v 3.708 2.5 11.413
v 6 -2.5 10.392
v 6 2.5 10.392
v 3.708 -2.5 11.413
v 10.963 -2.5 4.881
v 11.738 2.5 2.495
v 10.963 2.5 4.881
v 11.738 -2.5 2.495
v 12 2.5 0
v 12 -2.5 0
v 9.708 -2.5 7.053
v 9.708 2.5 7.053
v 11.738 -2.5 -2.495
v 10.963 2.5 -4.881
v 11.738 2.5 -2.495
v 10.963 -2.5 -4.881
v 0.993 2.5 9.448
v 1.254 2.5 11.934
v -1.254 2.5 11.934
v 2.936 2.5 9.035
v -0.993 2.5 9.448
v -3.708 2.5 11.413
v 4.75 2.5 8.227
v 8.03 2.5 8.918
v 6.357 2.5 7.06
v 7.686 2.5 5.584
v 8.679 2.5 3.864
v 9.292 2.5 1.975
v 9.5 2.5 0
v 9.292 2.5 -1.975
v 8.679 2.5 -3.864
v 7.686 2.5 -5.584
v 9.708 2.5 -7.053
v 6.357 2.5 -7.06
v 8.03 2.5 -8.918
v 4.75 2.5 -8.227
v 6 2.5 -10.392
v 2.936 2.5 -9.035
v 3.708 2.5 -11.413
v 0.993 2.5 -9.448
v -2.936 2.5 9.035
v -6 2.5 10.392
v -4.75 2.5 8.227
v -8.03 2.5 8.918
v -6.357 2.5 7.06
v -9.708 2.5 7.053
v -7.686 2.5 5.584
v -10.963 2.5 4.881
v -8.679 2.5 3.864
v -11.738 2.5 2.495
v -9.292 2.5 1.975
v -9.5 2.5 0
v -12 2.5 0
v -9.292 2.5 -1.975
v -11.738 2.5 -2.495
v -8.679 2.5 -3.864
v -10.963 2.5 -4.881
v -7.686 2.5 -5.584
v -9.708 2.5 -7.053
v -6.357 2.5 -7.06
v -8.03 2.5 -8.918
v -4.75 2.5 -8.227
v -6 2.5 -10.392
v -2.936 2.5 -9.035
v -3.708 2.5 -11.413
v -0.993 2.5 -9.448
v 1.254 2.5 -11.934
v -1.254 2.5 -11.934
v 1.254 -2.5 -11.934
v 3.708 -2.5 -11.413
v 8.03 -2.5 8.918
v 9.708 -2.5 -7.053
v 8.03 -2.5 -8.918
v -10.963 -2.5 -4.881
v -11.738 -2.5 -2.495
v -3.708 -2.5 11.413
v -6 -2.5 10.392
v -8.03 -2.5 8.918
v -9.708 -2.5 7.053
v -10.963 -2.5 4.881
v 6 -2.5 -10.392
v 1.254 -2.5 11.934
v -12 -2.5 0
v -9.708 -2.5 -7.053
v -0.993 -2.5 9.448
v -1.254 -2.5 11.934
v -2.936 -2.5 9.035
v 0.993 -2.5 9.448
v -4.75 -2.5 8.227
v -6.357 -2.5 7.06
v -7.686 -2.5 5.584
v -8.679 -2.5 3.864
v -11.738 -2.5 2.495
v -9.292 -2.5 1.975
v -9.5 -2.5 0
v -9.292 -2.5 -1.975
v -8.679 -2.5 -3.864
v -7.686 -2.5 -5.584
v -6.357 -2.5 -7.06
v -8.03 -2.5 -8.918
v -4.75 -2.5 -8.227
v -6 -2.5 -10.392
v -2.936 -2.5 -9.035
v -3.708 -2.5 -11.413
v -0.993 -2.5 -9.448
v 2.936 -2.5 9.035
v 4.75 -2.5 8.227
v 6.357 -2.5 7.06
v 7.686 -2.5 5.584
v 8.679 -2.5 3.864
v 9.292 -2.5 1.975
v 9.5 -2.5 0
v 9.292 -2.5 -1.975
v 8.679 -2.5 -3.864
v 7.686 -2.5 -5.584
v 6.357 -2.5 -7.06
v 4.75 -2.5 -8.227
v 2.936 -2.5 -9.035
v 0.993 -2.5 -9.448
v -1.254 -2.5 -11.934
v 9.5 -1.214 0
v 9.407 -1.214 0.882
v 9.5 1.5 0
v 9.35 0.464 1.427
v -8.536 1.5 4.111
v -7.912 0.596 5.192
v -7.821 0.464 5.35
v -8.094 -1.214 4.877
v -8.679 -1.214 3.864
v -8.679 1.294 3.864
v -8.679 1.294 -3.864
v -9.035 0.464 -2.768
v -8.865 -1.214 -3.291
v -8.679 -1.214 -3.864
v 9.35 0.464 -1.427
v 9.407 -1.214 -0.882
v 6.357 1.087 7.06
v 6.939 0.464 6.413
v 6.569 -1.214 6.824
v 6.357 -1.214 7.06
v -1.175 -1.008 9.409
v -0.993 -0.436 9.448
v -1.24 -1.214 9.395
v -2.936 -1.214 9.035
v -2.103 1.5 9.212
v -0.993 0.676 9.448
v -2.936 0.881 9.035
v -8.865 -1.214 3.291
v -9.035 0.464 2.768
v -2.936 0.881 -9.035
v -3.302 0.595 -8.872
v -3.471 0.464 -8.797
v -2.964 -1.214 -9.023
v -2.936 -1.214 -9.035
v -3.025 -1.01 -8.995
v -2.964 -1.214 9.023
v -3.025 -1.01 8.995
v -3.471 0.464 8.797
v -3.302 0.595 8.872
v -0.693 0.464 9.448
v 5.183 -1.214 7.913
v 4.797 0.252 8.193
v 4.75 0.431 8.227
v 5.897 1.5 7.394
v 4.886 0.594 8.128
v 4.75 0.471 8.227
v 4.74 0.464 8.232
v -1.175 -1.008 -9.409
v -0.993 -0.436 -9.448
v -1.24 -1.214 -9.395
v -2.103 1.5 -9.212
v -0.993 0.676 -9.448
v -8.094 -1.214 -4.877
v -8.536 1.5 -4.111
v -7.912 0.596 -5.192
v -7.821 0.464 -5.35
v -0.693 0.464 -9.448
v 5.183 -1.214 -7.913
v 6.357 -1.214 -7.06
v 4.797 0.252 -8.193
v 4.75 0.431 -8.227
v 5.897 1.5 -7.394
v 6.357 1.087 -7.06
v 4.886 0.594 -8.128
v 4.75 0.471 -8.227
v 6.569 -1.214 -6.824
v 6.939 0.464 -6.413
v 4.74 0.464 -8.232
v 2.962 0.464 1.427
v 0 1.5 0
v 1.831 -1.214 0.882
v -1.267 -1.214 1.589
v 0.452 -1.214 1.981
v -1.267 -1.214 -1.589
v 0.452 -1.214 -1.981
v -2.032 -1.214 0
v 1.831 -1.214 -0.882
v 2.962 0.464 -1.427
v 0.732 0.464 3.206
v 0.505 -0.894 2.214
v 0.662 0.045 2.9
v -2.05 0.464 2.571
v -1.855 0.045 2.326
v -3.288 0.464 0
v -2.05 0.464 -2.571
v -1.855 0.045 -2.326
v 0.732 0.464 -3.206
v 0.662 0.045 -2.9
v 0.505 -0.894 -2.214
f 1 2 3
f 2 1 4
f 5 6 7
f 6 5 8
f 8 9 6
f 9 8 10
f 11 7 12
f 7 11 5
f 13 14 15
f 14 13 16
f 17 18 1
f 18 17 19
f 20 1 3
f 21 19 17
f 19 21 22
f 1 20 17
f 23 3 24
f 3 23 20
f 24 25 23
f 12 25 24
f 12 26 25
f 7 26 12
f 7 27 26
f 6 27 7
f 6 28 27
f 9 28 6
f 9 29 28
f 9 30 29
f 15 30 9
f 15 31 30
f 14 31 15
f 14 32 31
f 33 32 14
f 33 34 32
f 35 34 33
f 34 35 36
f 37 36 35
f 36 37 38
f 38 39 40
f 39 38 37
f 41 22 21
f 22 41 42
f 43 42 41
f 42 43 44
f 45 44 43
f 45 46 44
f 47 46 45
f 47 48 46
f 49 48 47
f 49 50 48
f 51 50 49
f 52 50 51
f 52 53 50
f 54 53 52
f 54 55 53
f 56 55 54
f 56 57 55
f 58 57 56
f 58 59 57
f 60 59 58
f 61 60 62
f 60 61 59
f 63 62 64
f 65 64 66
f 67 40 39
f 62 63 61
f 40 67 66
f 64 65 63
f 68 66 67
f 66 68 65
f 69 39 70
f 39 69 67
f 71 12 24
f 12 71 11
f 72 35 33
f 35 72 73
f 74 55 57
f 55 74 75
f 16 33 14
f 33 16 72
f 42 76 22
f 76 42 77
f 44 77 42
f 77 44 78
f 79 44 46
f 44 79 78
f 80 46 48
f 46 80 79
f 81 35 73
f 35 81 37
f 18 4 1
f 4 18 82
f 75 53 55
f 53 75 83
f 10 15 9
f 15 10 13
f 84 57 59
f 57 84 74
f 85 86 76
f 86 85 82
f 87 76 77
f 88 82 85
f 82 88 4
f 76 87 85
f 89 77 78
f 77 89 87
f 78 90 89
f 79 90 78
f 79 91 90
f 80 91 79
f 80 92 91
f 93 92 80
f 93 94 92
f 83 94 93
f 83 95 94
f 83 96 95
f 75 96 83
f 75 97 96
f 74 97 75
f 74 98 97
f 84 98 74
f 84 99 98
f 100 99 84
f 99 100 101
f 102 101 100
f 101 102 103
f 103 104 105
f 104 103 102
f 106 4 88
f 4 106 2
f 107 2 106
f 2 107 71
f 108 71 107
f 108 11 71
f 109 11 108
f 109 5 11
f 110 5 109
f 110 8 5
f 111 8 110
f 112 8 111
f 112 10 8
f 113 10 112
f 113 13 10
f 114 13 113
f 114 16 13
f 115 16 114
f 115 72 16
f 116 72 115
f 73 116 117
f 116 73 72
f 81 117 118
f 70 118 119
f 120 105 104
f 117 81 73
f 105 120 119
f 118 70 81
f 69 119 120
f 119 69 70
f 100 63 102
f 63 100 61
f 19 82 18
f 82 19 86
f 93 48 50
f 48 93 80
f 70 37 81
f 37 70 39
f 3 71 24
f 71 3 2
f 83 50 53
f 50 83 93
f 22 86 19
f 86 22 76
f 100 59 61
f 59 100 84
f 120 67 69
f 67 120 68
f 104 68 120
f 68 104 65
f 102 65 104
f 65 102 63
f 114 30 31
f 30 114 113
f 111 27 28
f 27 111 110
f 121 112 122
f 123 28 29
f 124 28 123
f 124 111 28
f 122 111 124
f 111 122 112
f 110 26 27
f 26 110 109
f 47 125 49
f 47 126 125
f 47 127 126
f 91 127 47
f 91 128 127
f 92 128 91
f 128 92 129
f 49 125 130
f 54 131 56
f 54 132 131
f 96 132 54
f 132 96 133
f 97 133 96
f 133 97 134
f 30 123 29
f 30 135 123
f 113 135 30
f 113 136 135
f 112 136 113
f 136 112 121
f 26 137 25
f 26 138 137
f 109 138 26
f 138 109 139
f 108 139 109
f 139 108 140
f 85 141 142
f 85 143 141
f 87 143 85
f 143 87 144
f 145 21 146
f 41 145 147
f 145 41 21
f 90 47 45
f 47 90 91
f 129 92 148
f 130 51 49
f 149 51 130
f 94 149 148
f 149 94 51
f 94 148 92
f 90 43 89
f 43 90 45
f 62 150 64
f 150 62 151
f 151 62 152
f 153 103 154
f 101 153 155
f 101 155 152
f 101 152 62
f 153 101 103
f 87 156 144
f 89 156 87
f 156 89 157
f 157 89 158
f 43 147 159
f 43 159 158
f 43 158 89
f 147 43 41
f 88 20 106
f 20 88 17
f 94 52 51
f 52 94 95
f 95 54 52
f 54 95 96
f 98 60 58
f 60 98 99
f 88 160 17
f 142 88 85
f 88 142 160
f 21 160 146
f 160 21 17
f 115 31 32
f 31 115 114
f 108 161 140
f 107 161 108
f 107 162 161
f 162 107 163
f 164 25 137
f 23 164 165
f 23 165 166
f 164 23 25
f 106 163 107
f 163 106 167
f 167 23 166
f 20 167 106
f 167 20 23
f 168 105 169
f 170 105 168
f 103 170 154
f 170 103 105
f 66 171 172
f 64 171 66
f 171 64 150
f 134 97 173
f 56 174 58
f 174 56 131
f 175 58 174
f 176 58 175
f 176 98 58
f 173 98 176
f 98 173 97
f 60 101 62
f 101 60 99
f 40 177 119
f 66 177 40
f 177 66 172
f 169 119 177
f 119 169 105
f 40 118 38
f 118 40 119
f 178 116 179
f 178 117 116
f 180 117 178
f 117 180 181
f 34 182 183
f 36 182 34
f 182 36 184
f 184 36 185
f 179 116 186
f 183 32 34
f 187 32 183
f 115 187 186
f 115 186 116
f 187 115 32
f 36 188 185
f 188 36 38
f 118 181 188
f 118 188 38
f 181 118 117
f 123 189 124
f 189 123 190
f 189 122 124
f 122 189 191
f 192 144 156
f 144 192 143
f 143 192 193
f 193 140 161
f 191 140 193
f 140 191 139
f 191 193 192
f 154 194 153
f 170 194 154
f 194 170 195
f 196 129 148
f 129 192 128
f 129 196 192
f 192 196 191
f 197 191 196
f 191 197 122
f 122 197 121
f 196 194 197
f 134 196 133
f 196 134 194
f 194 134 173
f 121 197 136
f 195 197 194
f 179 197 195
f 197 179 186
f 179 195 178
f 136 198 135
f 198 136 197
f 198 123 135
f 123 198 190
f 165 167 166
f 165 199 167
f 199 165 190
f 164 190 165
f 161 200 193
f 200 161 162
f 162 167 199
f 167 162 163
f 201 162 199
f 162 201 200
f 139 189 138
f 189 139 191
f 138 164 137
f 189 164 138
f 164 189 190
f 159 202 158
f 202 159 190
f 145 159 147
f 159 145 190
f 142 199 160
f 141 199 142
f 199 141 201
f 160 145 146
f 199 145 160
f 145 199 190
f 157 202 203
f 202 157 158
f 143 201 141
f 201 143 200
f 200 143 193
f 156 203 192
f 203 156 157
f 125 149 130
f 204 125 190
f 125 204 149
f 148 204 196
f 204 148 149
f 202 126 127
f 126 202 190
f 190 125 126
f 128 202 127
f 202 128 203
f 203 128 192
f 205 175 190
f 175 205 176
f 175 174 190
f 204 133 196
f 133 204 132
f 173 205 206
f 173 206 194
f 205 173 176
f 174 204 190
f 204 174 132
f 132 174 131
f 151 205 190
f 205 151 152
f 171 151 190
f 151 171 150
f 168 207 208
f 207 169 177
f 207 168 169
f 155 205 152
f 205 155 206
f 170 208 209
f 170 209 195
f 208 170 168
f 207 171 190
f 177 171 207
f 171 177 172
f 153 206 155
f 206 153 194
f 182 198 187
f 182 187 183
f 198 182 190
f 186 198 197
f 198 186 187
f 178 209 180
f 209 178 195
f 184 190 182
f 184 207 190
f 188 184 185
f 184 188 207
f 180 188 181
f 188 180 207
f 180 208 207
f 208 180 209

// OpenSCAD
//$fn=100;

module spoked_wheel(radius=12, width=5, thickness=5, number_of_spokes=7, spoke_radius=1.5) {
    rotate([90,0,0]) {
    // Ring
    inner_radius = radius - thickness/2;
    difference() {
    cylinder(h=width, r=radius, center=true);
    cylinder(h=width + 1, r=inner_radius, center=true);
    }
    
    // Spokes
    spoke_length = radius - thickness / 4;
    step = 360 / number_of_spokes;
    for (i=[0:step:359]) {
        angle = i;
        rotate([0,90,angle])
            cylinder(h=spoke_length, r=spoke_radius);
        }
    }
}

spoked_wheel();
